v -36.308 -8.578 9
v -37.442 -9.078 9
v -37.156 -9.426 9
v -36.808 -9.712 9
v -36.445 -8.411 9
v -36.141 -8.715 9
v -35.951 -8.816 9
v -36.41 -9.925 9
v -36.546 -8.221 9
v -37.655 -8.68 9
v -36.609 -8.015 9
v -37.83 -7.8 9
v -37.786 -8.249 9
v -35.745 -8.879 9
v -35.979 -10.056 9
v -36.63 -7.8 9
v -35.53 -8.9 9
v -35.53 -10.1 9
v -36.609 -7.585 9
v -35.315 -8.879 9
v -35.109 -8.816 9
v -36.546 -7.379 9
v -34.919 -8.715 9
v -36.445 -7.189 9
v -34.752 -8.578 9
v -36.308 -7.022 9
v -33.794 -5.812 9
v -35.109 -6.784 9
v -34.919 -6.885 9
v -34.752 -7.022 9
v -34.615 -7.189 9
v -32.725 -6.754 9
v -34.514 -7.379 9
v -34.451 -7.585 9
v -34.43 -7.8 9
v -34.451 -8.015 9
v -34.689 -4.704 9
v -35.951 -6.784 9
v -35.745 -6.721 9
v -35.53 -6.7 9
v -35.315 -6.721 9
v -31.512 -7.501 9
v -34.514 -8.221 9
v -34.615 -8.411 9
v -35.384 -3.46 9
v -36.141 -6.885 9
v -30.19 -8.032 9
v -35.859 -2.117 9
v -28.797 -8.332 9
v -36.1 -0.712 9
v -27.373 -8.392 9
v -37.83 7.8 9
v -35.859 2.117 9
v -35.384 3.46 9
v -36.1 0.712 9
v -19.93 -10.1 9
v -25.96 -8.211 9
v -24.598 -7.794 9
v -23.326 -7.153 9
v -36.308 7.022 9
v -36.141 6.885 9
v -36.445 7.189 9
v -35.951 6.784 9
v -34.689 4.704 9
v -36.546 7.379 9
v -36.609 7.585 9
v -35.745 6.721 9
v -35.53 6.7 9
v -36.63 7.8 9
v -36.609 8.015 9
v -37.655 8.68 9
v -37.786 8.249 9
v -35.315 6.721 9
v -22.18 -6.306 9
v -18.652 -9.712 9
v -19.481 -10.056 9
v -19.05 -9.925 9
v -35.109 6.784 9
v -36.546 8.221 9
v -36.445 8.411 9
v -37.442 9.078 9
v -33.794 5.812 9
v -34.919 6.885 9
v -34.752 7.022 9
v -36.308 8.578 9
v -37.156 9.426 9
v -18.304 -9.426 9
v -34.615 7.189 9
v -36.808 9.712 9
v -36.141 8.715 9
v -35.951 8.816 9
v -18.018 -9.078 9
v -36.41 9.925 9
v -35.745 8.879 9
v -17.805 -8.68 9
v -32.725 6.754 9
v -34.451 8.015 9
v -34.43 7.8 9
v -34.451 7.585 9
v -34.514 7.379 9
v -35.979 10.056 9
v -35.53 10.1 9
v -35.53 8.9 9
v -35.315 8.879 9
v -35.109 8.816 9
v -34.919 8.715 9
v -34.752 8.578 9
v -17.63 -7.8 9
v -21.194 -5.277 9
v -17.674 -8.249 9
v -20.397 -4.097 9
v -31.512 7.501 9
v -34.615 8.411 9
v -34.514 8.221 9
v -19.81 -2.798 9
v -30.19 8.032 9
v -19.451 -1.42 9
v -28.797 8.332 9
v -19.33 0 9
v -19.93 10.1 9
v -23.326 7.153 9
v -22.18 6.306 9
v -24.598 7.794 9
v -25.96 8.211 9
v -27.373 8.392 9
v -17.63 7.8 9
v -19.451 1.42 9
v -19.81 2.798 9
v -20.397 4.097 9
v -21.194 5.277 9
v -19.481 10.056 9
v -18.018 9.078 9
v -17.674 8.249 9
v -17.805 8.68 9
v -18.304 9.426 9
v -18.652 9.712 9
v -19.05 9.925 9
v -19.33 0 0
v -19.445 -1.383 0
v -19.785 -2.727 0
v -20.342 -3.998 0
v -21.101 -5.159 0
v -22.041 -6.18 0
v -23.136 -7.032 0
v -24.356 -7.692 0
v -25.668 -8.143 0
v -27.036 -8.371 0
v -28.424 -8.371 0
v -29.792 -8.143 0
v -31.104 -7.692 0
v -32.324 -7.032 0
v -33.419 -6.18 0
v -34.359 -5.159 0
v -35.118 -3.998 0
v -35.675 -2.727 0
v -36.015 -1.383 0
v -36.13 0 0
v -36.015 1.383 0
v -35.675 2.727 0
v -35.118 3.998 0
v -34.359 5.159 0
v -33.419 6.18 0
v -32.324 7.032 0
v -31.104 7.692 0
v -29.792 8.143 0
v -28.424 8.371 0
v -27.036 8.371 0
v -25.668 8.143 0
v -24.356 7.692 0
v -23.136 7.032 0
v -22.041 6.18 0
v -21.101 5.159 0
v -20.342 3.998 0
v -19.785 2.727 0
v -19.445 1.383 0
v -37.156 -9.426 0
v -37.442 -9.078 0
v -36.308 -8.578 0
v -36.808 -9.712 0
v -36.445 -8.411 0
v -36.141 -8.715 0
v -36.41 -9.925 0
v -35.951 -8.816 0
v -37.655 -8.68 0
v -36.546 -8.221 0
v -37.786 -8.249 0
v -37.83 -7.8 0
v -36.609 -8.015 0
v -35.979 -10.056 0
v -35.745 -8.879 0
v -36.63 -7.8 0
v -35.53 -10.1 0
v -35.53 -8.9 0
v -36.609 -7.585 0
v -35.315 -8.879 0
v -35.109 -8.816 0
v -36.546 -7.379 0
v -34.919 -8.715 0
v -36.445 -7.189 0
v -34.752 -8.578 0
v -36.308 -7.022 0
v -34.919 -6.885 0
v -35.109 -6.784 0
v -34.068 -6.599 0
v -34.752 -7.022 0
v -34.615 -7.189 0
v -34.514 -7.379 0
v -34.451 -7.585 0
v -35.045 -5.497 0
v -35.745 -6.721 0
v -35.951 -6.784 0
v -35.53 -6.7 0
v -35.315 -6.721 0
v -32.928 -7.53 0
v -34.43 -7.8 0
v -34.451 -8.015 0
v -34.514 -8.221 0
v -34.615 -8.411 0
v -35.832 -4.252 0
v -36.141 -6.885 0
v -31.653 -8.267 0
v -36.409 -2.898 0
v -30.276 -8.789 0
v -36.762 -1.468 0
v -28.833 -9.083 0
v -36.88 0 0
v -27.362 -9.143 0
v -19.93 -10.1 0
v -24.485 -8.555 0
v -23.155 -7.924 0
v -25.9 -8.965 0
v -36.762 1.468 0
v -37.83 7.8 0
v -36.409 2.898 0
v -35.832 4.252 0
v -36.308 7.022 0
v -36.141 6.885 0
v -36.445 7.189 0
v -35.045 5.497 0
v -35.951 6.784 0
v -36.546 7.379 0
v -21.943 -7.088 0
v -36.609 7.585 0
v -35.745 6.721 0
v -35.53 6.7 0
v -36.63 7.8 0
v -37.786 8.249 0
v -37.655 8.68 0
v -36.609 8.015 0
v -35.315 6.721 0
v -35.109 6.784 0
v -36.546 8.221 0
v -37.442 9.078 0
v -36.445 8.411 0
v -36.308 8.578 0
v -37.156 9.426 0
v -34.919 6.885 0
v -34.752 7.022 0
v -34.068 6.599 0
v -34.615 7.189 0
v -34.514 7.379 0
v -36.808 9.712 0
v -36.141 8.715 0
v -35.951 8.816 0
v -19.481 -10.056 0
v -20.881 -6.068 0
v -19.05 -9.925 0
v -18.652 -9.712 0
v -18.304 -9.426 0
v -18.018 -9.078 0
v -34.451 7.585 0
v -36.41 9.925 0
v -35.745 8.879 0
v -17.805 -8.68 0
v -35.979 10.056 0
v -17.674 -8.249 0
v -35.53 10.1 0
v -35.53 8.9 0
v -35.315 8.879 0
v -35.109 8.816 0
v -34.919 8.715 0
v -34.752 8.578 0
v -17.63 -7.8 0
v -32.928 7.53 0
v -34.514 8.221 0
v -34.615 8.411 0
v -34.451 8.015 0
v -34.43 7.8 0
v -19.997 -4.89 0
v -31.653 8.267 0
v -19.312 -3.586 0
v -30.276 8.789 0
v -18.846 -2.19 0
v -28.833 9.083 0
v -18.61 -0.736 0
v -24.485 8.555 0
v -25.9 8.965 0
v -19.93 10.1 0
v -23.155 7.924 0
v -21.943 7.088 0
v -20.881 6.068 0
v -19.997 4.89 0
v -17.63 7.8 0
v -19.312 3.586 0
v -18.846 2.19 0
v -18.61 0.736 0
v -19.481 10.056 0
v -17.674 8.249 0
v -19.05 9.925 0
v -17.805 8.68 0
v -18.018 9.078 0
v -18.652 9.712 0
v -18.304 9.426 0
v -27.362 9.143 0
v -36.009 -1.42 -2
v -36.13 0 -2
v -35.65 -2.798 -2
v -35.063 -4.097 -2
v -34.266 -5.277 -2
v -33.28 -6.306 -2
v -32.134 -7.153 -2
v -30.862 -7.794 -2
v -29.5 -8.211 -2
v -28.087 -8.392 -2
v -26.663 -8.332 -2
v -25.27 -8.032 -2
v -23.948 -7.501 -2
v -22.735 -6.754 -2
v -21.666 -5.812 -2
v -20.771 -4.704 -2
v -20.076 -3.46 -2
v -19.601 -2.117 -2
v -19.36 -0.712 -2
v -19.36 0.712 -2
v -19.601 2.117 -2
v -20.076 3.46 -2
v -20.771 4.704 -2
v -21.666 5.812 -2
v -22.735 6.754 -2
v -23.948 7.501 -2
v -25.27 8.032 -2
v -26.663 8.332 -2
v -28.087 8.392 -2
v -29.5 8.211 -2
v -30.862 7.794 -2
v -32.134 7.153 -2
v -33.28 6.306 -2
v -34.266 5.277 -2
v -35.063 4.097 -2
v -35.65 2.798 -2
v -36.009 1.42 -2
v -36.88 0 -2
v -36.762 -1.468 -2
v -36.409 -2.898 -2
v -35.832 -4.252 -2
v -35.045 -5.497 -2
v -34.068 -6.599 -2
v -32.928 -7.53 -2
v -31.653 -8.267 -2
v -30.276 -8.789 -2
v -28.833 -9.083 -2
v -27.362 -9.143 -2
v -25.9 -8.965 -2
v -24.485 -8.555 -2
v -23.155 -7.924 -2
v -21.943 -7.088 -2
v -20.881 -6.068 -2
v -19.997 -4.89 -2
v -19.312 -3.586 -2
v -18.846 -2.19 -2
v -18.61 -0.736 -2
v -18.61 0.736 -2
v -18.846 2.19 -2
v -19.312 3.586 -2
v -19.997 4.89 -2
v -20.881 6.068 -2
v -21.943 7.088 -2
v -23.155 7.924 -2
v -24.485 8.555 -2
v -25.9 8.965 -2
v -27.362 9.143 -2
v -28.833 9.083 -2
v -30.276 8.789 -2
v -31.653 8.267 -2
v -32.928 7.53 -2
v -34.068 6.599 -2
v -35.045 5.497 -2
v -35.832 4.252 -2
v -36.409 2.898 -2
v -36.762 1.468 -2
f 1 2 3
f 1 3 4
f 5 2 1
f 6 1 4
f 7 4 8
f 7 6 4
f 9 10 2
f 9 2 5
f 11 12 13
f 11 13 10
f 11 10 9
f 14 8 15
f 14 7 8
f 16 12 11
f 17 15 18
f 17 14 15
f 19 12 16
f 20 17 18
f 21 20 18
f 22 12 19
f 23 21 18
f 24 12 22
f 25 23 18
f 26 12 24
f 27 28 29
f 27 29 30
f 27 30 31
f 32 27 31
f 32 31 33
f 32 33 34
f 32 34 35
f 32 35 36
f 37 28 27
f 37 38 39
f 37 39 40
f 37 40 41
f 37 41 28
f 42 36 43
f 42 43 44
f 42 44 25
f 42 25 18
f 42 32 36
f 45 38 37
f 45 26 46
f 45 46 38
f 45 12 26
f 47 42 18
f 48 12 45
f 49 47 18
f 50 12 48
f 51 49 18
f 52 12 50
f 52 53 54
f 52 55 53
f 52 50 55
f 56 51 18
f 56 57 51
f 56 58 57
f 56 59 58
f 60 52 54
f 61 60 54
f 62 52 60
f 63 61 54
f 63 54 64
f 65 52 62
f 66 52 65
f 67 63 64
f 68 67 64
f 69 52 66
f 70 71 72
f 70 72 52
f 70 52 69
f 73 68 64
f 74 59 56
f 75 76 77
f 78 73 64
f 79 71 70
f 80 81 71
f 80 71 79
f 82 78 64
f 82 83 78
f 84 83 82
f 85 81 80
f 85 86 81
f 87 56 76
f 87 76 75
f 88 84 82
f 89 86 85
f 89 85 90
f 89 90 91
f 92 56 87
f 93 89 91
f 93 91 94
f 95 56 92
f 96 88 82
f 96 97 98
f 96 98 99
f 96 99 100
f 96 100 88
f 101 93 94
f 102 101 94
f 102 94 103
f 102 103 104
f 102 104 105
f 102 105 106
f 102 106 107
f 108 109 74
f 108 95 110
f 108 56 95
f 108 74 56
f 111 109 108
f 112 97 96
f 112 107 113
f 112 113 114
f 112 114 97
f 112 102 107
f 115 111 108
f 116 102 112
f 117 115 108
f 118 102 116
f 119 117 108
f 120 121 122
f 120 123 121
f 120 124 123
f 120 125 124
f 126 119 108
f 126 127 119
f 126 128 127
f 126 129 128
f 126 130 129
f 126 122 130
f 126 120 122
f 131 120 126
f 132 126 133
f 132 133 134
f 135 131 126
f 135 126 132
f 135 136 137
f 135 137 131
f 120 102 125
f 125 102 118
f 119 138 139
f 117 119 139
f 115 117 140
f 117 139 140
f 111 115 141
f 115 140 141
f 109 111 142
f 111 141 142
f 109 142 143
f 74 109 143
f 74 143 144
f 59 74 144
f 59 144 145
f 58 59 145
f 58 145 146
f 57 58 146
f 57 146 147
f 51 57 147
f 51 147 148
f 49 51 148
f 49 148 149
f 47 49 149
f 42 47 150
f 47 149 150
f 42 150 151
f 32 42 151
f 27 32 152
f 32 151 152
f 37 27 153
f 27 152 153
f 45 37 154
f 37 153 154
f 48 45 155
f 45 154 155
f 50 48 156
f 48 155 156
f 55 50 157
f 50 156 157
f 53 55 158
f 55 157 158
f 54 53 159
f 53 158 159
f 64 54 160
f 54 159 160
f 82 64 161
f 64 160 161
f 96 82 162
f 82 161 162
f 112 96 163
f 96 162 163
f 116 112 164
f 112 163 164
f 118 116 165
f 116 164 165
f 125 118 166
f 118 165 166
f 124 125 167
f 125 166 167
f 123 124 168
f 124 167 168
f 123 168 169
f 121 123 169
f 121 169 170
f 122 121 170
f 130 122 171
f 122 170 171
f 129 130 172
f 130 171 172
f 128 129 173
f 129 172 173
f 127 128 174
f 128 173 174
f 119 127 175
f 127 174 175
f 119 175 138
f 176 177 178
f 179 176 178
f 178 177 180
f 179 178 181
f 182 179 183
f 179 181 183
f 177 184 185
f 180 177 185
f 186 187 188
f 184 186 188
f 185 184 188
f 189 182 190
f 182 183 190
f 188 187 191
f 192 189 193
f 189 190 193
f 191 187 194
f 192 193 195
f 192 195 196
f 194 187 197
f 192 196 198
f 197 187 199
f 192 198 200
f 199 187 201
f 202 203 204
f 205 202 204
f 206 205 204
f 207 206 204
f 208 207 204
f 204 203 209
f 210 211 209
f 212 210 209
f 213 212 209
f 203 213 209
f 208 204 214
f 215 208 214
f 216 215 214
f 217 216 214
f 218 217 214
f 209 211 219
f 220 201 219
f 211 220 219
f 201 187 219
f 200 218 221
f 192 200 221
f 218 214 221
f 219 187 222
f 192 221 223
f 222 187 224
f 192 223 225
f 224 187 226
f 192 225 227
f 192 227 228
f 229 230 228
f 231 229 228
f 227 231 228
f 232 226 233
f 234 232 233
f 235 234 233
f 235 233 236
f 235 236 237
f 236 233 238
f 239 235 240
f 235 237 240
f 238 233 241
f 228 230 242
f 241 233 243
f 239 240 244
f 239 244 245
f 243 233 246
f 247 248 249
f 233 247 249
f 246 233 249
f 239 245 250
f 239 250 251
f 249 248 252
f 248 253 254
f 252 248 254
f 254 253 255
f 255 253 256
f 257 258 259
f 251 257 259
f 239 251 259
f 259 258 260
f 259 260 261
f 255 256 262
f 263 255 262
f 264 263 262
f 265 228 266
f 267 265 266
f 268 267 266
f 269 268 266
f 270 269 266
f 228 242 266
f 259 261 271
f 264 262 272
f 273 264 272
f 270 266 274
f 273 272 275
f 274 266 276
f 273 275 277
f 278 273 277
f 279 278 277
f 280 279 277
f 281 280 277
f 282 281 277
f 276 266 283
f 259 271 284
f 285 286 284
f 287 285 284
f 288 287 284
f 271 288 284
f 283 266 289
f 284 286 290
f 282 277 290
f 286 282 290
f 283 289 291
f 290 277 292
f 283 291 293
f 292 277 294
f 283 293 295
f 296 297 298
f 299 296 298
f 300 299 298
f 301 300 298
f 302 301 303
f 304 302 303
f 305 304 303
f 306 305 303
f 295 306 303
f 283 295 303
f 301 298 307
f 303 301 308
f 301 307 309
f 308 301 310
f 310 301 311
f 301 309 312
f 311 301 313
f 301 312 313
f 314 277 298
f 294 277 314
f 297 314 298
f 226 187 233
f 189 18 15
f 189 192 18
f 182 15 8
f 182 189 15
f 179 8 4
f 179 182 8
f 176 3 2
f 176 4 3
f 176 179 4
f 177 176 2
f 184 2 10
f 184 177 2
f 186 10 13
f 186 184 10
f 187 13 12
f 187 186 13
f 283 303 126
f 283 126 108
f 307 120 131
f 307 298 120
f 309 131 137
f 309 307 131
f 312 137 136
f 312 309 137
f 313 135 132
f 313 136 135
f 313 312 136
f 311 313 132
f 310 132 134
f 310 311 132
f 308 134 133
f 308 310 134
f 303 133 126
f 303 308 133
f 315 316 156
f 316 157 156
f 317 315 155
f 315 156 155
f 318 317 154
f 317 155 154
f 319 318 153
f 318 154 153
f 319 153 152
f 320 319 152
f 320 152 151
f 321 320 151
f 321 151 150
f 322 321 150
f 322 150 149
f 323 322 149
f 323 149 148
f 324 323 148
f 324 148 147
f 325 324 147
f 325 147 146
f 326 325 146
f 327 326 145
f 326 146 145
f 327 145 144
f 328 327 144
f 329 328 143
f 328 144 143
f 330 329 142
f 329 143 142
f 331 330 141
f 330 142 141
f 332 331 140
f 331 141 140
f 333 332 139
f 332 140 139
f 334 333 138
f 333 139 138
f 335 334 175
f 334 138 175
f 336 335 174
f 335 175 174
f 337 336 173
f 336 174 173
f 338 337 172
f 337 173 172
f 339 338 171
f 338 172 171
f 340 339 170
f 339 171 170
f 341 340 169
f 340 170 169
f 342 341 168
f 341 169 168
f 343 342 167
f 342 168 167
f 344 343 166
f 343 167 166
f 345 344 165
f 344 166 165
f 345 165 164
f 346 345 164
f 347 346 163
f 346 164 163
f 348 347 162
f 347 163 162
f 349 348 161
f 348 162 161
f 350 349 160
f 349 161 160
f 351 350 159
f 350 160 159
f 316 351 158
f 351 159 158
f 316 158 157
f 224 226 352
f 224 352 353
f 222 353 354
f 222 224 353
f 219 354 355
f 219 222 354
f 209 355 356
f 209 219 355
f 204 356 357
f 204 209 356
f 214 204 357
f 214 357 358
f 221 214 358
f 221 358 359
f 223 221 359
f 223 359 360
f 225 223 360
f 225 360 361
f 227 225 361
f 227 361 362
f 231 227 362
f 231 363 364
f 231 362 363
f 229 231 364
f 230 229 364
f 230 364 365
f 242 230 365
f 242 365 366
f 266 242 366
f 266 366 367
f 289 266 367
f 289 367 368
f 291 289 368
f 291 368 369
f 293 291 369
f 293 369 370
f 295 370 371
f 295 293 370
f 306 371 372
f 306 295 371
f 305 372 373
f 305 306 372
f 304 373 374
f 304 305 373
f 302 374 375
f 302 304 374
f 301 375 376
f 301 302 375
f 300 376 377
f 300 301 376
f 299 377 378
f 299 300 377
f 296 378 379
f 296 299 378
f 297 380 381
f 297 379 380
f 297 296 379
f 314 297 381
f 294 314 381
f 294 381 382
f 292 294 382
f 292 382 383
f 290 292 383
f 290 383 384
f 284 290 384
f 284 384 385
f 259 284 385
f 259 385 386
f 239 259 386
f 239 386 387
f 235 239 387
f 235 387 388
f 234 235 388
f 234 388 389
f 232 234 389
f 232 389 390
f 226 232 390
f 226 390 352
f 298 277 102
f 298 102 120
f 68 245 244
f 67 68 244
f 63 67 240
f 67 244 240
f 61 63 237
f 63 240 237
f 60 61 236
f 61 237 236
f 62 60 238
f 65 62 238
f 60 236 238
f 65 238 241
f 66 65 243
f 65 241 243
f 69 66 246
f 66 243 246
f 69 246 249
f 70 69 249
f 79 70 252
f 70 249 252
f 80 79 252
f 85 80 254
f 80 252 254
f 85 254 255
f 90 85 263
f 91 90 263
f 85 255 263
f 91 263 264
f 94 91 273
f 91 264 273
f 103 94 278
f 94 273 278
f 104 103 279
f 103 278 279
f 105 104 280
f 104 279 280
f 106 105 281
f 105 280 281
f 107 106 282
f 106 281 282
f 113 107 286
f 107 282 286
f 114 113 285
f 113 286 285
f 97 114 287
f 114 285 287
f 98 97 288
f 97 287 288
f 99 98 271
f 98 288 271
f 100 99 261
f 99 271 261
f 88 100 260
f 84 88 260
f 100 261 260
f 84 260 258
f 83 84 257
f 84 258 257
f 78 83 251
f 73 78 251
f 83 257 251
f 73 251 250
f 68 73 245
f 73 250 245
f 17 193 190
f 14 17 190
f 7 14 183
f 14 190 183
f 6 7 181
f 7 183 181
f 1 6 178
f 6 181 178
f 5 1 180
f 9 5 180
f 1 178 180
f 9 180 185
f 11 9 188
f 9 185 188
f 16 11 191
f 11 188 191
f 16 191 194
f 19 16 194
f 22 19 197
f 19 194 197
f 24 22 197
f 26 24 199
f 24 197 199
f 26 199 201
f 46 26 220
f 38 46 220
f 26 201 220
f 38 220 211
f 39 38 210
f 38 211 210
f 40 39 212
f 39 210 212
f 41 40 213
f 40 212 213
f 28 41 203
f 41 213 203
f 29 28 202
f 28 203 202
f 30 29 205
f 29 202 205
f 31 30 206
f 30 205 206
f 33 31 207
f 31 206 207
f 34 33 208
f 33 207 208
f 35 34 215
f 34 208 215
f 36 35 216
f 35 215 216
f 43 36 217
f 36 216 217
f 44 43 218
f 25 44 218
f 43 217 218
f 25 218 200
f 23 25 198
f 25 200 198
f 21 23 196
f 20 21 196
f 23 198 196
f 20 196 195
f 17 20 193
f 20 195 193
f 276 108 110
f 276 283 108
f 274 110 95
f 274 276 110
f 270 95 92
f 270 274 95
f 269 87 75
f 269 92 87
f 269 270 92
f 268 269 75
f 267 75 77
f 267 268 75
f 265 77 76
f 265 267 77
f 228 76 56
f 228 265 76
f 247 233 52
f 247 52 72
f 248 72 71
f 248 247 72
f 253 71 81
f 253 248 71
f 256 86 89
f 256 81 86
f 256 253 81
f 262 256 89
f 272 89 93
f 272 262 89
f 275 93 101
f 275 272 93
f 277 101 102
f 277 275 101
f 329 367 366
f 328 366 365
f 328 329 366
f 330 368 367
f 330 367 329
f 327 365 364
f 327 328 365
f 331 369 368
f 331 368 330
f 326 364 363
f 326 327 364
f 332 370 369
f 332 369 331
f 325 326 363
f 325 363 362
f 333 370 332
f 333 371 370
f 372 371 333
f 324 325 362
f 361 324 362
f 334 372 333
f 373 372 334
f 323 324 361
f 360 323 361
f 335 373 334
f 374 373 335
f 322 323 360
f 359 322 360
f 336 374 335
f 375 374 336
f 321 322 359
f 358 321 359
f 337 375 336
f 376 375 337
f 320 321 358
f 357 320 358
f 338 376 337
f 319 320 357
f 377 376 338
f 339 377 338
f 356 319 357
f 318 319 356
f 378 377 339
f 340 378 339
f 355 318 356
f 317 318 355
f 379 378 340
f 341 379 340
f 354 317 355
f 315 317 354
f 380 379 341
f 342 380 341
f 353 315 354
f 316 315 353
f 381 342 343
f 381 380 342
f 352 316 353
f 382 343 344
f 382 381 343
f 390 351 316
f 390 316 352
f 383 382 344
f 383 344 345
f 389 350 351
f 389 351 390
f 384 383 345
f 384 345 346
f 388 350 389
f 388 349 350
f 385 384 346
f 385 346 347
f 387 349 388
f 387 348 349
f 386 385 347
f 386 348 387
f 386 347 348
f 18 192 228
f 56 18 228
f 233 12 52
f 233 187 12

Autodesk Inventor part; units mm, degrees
ref_plane "YZ Plane" through (0, 0, 0) normal (1, 0, 0) x (0, 1, 0)
ref_plane "XZ Plane" through (0, 0, 0) normal (0, 1, 0) x (-1, 0, 0)
ref_plane "XY Plane" through (0, 0, 0) normal (0, 0, 1) x (1, 0, 0)
ref_plane "Work Plane1" through (0, 0, 0) normal (0, 0, 1) x (1, 0, 0)
sketch "Sketch1" plane through (0, 0, 0) normal (0, 0, 1) x (1, 0, 0)
  line L0 (3.99, 16.87) -> (-0.09, 16.87) projected
  line L1 (-3.99, 20.77) -> (-0.09, 16.87) projected
  line L2 (-3.99, 24.85) -> (-3.99, 20.77) projected
  line L3 (-37.73, 24.85) -> (-3.99, 24.85) projected
  line L4 (-37.73, 16.87) -> (-37.73, 24.85) projected
  line L5 (-45.71, 16.87) -> (-37.73, 16.87) projected
  line L6 (-45.71, -16.87) -> (-45.71, -13.8689) projected
  line L7 (-41.63, -16.87) -> (-45.71, -16.87) projected
  line L8 (-37.73, -20.77) -> (-41.63, -16.87) projected
  line L9 (-37.73, -20.77) -> (-37.73, -24.85) projected
  line L10 (-37.73, -24.85) -> (-3.99, -24.85) projected
  line L11 (-3.99, -24.85) -> (-3.99, -20.77) projected
  line L12 (-0.09, -16.87) -> (-3.99, -20.77) projected
  line L13 (-0.09, -16.87) -> (3.99, -16.87) projected
  line L14 (3.99, -16.87) -> (3.99, 16.87) projected
  arc A0 (-35.53, 10.1) -> (-37.83, 7.8) centre (-35.53, 7.8) ccw projected
  line L15 (-37.83, -16.97) -> (-37.83, 16.97) construction
  arc A1 (-37.83, -7.8) -> (-35.53, -10.1) centre (-35.53, -7.8) ccw projected
  arc A2 (-19.93, -10.1) -> (-17.63, -7.8) centre (-19.93, -7.8) ccw projected
  arc A3 (-17.63, 7.8) -> (-19.93, 10.1) centre (-19.93, 7.8) ccw projected
  line L16 (-37.83, -7.8) -> (-37.83, 7.8)
  line L17 (-35.53, 10.1) -> (-19.93, 10.1)
  line L18 (-17.63, 7.8) -> (-17.63, -7.8)
  line L19 (-35.53, -10.1) -> (-19.93, -10.1)
  circle A4 centre (-27.73, 0) radius 8.4
  line L20 (-45.71, 13.8689) -> (-40.3869, 13.8689) projected
  line L21 (-40.3869, 13.8689) -> (-34.7289, 19.5269) projected
  line L22 (-34.7289, 19.5269) -> (-8.86, 19.5269) projected
  line L23 (-8.86, 19.5269) -> (-8.86, -19.5269) projected
  line L24 (-8.86, -19.5269) -> (-34.7289, -19.5269) projected
  line L25 (-34.7289, -19.5269) -> (-40.3869, -13.8689) projected
  line L26 (-40.3869, -13.8689) -> (-45.71, -13.8689) projected
  line L27 (-45.71, 13.8689) -> (-45.71, 16.87) projected
  point P0 (0, 0)
  point P1 (-17.63, -7.8)
extrude "Extrusion1" add sketch "Sketch1" along normal blind 9 contours L17 A3 L18 A2 L19 A1 L16 A0
sketch "Sketch2" plane through (0, 0, 9) normal (0, 0, 1) x (1, 0, 0)
  circle A0 centre (-20.86, 0) radius 16.97 construction
  line L0 (-19.93, 10.1) -> (-35.53, 10.1) projected
  arc A1 (-35.53, 10.1) -> (-37.83, 7.8) centre (-35.53, 7.8) ccw projected
  line L1 (-37.83, 7.8) -> (-37.83, -7.8) projected
  arc A2 (-37.83, -7.8) -> (-35.53, -10.1) centre (-35.53, -7.8) ccw projected
  line L2 (-35.53, -10.1) -> (-19.93, -10.1) projected
  arc A3 (-19.93, -10.1) -> (-17.63, -7.8) centre (-19.93, -7.8) ccw projected
  line L3 (-17.63, -7.8) -> (-17.63, 7.8) projected
  arc A4 (-17.63, 7.8) -> (-19.93, 10.1) centre (-19.93, 7.8) ccw projected
  point P0 (0, 0)
hole "Hole1" at (-35.53, -7.8, 9) at (-35.53, 7.8, 9) direction (0, 0, -1) diameter 2.2 depth 15 tip angle 118
sketch "Sketch3" plane through (0, 0, 0) normal (0, 0, -1) x (-1, 0, 0)
  circle A0 centre (27.73, 0) radius 8.4 projected
  circle A1 centre (27.73, 0) radius 9.25 projected
  circle A2 centre (27.73, 0) radius 9.15
  point P0 (0, 0)
  dimension "d10" = 0.1
extrude "Extrusion2" add sketch "Sketch3" along normal blind 2 contours A2
properties part number "30_Cube_SQUID_Z_Focus_spacer_v3"
